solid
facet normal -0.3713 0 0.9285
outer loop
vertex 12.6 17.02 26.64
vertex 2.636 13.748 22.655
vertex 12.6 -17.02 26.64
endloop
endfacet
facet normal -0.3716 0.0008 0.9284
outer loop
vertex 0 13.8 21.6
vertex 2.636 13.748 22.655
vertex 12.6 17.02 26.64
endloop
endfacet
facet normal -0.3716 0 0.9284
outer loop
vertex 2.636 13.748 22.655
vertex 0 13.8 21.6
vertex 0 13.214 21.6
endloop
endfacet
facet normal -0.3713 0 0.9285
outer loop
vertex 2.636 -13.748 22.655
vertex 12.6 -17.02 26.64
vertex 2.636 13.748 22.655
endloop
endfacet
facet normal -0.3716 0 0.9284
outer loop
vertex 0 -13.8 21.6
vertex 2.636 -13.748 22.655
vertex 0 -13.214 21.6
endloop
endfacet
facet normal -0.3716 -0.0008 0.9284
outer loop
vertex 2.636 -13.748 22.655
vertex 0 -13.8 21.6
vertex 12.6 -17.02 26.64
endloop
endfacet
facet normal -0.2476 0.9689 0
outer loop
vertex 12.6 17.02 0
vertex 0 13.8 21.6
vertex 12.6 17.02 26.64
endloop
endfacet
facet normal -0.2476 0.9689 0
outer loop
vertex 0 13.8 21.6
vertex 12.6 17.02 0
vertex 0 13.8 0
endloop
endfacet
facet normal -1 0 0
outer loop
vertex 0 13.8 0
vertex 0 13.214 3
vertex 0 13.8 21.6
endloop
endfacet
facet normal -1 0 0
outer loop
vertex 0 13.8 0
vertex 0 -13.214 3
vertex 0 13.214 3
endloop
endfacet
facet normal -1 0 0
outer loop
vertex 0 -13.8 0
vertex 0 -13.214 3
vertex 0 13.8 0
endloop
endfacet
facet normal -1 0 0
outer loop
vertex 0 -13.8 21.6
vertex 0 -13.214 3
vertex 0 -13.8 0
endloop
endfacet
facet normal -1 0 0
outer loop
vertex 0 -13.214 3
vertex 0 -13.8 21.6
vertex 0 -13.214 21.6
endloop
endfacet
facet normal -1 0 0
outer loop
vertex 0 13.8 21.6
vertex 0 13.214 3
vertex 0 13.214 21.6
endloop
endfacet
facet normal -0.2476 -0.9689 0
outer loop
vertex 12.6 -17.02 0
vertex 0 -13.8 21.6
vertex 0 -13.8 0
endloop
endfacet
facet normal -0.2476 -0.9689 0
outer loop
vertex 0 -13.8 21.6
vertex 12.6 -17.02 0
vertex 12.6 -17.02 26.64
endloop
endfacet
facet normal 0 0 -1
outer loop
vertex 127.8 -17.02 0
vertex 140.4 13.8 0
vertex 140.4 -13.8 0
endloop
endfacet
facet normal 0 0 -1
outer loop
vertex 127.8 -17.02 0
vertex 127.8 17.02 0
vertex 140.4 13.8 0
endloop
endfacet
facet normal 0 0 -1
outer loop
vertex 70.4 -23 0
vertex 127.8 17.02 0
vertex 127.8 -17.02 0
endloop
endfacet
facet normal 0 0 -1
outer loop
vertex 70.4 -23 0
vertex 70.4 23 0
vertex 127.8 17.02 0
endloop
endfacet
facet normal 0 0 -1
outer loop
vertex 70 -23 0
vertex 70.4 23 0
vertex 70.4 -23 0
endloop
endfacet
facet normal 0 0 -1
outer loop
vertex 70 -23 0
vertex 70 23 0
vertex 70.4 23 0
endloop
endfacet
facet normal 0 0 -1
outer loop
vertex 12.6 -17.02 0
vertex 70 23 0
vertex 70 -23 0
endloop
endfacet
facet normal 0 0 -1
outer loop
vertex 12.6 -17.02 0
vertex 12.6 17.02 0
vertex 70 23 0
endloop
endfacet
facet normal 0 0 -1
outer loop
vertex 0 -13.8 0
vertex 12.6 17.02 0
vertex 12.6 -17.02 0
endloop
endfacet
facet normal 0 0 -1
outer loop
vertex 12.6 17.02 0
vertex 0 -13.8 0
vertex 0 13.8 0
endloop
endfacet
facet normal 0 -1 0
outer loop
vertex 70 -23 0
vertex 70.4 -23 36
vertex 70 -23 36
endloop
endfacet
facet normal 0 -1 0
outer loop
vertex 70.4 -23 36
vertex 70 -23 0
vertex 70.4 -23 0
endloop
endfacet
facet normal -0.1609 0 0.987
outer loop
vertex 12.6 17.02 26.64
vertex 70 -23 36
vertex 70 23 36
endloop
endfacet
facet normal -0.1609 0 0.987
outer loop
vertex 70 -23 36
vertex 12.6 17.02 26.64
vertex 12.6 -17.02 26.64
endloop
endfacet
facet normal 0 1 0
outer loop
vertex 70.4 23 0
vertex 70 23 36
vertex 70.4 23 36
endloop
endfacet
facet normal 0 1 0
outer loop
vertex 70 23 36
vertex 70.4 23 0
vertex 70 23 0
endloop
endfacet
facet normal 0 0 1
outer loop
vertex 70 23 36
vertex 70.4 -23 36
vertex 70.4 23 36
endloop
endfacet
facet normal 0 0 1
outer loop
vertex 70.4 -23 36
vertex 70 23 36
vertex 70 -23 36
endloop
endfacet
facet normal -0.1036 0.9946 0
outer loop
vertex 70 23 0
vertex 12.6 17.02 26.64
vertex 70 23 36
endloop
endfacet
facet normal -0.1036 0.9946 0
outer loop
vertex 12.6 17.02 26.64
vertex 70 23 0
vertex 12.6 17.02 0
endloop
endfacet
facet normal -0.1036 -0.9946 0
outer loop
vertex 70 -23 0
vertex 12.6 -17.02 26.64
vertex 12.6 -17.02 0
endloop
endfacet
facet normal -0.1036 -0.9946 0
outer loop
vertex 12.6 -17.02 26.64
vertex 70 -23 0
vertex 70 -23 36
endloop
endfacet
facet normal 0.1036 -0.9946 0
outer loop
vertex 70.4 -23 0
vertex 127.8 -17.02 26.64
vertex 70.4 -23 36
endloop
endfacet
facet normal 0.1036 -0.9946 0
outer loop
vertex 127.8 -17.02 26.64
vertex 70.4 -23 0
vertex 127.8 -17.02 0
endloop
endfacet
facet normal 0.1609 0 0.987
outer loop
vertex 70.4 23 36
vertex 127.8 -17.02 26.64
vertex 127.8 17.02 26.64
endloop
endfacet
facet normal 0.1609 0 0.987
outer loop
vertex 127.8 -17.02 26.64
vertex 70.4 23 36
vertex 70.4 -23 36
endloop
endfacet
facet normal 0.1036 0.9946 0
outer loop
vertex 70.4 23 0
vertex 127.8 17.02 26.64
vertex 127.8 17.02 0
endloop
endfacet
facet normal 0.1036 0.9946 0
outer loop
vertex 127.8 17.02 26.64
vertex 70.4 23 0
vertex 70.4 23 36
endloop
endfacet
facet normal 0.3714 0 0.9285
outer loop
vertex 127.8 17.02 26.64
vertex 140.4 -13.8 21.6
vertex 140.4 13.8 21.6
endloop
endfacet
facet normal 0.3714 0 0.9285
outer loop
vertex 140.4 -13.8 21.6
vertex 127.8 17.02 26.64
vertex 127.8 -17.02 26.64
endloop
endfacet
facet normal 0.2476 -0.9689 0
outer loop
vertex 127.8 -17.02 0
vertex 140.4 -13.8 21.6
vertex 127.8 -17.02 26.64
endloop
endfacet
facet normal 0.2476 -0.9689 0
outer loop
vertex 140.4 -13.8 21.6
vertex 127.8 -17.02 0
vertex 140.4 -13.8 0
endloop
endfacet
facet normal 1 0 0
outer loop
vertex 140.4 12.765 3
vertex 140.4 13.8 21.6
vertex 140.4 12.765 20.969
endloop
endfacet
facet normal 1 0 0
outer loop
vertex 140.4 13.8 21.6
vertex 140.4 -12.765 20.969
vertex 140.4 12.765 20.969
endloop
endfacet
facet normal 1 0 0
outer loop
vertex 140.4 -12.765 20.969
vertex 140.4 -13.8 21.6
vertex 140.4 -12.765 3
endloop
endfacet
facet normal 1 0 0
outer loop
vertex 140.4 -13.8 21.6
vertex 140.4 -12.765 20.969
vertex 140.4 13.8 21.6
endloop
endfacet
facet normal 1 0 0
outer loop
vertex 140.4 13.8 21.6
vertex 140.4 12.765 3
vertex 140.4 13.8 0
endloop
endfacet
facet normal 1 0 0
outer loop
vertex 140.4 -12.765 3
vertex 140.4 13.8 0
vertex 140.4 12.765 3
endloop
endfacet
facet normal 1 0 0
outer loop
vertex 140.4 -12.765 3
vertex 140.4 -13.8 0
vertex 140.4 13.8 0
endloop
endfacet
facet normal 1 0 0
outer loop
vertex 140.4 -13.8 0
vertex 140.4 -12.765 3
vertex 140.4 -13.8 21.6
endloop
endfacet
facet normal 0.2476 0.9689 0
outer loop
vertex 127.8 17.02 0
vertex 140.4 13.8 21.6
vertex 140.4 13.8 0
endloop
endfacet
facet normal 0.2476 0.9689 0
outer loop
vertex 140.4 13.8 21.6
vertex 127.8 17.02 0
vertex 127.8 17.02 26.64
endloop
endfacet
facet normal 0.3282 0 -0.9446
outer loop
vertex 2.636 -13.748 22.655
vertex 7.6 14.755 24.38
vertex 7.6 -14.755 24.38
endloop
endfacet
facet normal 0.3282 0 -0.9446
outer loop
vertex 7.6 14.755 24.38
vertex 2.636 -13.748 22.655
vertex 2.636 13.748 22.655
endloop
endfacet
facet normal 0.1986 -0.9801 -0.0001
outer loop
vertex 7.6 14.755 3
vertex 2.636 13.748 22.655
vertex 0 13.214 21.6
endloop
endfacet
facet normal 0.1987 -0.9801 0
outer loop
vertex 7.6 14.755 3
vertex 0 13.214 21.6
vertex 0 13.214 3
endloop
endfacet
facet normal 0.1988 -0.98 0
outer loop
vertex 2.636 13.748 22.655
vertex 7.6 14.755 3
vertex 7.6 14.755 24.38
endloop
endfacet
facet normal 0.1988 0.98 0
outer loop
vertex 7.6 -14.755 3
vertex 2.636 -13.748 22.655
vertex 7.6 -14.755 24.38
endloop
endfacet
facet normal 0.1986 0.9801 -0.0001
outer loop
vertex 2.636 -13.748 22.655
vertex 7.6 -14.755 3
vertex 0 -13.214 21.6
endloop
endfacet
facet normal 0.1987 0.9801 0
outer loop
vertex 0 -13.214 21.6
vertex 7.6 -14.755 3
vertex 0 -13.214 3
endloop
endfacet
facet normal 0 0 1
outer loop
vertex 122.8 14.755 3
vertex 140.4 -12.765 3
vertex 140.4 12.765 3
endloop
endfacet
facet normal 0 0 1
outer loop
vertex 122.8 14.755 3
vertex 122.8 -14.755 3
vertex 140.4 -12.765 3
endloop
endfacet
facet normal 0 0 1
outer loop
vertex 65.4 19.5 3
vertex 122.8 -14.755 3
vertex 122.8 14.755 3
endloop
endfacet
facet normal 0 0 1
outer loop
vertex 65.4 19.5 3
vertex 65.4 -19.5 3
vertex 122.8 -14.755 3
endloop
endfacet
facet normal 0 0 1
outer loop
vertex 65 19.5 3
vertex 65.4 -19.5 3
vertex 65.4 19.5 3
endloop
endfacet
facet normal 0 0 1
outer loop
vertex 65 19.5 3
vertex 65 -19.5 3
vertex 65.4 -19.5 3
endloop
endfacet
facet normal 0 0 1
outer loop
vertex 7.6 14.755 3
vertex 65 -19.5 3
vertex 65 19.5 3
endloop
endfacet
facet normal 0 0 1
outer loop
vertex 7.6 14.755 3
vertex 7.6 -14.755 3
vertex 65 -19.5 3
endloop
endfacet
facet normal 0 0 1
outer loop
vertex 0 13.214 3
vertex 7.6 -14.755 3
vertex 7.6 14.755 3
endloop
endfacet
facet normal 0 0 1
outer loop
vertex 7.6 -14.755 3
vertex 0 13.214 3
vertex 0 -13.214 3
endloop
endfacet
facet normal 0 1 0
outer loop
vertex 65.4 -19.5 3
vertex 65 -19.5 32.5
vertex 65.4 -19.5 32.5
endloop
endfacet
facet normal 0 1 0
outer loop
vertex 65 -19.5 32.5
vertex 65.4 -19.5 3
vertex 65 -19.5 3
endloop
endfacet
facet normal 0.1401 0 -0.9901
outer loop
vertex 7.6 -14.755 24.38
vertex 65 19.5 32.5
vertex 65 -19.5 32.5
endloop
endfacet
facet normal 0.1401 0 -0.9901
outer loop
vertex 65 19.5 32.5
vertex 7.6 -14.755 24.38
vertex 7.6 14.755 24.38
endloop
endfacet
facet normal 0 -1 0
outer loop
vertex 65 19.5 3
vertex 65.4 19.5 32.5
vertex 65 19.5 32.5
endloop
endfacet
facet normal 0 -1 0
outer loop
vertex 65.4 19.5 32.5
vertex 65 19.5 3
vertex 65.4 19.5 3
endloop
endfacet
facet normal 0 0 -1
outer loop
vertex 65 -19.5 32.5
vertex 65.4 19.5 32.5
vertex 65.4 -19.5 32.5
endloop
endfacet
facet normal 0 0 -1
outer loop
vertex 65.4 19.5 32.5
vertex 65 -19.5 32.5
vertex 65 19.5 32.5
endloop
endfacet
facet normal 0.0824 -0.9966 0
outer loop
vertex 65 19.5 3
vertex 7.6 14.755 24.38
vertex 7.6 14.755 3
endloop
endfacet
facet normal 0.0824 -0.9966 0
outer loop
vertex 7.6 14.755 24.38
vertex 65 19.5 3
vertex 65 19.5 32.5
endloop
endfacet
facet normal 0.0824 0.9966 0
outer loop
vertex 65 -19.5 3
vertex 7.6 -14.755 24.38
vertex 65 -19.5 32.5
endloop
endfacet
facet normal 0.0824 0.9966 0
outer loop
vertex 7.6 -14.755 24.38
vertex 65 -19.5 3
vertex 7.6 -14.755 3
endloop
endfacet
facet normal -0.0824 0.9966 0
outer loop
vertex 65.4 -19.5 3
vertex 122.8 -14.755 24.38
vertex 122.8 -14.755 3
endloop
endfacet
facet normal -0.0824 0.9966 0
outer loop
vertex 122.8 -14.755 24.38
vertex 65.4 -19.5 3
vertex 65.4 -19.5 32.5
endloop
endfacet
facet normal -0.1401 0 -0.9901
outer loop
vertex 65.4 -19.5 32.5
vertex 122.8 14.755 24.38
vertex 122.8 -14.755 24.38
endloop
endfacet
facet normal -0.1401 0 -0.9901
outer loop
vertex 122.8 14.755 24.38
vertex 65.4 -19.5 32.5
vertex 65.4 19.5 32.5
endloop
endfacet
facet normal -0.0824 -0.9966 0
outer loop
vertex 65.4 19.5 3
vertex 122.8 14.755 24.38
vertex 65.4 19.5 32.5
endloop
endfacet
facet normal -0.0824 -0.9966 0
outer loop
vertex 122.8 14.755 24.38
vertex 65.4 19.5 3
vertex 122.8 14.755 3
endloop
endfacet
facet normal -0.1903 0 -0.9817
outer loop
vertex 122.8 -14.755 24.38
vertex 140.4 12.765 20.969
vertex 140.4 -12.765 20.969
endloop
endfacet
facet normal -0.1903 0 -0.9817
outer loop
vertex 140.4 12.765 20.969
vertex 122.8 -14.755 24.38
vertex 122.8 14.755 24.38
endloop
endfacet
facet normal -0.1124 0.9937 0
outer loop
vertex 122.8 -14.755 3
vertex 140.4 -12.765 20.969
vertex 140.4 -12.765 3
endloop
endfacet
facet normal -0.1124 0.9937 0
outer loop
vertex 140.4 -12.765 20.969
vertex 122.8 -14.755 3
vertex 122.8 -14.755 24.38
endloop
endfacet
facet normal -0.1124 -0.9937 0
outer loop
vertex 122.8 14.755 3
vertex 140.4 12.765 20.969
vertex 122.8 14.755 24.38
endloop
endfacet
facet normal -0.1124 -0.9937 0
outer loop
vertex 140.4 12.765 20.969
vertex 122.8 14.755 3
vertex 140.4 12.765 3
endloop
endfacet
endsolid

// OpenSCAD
$fn = 32;

// ----------------------------------------------------------------------
// Faired channel: 140 x 46 x 36 mm, 3.5 mm walls, faired ends
// ----------------------------------------------------------------------

// --- parameters (mm) ---
length = 140;             // channel length
width = 46;               // channel width at mid length
height = 36;              // channel height at mid length
wall = 3.5;               // side wall thickness
floor_t = 3;              // floor thickness
end_w = 27.6;             // faired end width
end_h = 21.6;             // faired end height

difference() {
  union() {
    hull() {
      translate([0, -13.8, 0]) cube([0.4, 27.6, 21.6]);
      translate([12.6, -17.02, 0]) cube([0.4, 34.04, 26.64]);
    }
    hull() {
      translate([12.6, -17.02, 0]) cube([0.4, 34.04, 26.64]);
      translate([70, -23, 0]) cube([0.4, 46, 36]);
    }
    hull() {
      translate([70, -23, 0]) cube([0.4, 46, 36]);
      translate([127.4, -17.02, 0]) cube([0.4, 34.04, 26.64]);
    }
    hull() {
      translate([127.4, -17.02, 0]) cube([0.4, 34.04, 26.64]);
      translate([140, -13.8, 0]) cube([0.4, 27.6, 21.6]);
    }
  }
  /* cavity, 5 mm proud of both ends so the ports are cut clean */
  hull() {
    translate([-5, -12.2, 3]) cube([0.4, 24.4, 17]);
    translate([7.6, -14.755, 3]) cube([0.4, 29.51, 21.38]);
  }
  hull() {
    translate([7.6, -14.755, 3]) cube([0.4, 29.51, 21.38]);
    translate([65, -19.5, 3]) cube([0.4, 39, 29.5]);
  }
  hull() {
    translate([65, -19.5, 3]) cube([0.4, 39, 29.5]);
    translate([122.4, -14.755, 3]) cube([0.4, 29.51, 21.38]);
  }
  hull() {
    translate([122.4, -14.755, 3]) cube([0.4, 29.51, 21.38]);
    translate([145, -12.2, 3]) cube([0.4, 24.4, 17]);
  }
}
